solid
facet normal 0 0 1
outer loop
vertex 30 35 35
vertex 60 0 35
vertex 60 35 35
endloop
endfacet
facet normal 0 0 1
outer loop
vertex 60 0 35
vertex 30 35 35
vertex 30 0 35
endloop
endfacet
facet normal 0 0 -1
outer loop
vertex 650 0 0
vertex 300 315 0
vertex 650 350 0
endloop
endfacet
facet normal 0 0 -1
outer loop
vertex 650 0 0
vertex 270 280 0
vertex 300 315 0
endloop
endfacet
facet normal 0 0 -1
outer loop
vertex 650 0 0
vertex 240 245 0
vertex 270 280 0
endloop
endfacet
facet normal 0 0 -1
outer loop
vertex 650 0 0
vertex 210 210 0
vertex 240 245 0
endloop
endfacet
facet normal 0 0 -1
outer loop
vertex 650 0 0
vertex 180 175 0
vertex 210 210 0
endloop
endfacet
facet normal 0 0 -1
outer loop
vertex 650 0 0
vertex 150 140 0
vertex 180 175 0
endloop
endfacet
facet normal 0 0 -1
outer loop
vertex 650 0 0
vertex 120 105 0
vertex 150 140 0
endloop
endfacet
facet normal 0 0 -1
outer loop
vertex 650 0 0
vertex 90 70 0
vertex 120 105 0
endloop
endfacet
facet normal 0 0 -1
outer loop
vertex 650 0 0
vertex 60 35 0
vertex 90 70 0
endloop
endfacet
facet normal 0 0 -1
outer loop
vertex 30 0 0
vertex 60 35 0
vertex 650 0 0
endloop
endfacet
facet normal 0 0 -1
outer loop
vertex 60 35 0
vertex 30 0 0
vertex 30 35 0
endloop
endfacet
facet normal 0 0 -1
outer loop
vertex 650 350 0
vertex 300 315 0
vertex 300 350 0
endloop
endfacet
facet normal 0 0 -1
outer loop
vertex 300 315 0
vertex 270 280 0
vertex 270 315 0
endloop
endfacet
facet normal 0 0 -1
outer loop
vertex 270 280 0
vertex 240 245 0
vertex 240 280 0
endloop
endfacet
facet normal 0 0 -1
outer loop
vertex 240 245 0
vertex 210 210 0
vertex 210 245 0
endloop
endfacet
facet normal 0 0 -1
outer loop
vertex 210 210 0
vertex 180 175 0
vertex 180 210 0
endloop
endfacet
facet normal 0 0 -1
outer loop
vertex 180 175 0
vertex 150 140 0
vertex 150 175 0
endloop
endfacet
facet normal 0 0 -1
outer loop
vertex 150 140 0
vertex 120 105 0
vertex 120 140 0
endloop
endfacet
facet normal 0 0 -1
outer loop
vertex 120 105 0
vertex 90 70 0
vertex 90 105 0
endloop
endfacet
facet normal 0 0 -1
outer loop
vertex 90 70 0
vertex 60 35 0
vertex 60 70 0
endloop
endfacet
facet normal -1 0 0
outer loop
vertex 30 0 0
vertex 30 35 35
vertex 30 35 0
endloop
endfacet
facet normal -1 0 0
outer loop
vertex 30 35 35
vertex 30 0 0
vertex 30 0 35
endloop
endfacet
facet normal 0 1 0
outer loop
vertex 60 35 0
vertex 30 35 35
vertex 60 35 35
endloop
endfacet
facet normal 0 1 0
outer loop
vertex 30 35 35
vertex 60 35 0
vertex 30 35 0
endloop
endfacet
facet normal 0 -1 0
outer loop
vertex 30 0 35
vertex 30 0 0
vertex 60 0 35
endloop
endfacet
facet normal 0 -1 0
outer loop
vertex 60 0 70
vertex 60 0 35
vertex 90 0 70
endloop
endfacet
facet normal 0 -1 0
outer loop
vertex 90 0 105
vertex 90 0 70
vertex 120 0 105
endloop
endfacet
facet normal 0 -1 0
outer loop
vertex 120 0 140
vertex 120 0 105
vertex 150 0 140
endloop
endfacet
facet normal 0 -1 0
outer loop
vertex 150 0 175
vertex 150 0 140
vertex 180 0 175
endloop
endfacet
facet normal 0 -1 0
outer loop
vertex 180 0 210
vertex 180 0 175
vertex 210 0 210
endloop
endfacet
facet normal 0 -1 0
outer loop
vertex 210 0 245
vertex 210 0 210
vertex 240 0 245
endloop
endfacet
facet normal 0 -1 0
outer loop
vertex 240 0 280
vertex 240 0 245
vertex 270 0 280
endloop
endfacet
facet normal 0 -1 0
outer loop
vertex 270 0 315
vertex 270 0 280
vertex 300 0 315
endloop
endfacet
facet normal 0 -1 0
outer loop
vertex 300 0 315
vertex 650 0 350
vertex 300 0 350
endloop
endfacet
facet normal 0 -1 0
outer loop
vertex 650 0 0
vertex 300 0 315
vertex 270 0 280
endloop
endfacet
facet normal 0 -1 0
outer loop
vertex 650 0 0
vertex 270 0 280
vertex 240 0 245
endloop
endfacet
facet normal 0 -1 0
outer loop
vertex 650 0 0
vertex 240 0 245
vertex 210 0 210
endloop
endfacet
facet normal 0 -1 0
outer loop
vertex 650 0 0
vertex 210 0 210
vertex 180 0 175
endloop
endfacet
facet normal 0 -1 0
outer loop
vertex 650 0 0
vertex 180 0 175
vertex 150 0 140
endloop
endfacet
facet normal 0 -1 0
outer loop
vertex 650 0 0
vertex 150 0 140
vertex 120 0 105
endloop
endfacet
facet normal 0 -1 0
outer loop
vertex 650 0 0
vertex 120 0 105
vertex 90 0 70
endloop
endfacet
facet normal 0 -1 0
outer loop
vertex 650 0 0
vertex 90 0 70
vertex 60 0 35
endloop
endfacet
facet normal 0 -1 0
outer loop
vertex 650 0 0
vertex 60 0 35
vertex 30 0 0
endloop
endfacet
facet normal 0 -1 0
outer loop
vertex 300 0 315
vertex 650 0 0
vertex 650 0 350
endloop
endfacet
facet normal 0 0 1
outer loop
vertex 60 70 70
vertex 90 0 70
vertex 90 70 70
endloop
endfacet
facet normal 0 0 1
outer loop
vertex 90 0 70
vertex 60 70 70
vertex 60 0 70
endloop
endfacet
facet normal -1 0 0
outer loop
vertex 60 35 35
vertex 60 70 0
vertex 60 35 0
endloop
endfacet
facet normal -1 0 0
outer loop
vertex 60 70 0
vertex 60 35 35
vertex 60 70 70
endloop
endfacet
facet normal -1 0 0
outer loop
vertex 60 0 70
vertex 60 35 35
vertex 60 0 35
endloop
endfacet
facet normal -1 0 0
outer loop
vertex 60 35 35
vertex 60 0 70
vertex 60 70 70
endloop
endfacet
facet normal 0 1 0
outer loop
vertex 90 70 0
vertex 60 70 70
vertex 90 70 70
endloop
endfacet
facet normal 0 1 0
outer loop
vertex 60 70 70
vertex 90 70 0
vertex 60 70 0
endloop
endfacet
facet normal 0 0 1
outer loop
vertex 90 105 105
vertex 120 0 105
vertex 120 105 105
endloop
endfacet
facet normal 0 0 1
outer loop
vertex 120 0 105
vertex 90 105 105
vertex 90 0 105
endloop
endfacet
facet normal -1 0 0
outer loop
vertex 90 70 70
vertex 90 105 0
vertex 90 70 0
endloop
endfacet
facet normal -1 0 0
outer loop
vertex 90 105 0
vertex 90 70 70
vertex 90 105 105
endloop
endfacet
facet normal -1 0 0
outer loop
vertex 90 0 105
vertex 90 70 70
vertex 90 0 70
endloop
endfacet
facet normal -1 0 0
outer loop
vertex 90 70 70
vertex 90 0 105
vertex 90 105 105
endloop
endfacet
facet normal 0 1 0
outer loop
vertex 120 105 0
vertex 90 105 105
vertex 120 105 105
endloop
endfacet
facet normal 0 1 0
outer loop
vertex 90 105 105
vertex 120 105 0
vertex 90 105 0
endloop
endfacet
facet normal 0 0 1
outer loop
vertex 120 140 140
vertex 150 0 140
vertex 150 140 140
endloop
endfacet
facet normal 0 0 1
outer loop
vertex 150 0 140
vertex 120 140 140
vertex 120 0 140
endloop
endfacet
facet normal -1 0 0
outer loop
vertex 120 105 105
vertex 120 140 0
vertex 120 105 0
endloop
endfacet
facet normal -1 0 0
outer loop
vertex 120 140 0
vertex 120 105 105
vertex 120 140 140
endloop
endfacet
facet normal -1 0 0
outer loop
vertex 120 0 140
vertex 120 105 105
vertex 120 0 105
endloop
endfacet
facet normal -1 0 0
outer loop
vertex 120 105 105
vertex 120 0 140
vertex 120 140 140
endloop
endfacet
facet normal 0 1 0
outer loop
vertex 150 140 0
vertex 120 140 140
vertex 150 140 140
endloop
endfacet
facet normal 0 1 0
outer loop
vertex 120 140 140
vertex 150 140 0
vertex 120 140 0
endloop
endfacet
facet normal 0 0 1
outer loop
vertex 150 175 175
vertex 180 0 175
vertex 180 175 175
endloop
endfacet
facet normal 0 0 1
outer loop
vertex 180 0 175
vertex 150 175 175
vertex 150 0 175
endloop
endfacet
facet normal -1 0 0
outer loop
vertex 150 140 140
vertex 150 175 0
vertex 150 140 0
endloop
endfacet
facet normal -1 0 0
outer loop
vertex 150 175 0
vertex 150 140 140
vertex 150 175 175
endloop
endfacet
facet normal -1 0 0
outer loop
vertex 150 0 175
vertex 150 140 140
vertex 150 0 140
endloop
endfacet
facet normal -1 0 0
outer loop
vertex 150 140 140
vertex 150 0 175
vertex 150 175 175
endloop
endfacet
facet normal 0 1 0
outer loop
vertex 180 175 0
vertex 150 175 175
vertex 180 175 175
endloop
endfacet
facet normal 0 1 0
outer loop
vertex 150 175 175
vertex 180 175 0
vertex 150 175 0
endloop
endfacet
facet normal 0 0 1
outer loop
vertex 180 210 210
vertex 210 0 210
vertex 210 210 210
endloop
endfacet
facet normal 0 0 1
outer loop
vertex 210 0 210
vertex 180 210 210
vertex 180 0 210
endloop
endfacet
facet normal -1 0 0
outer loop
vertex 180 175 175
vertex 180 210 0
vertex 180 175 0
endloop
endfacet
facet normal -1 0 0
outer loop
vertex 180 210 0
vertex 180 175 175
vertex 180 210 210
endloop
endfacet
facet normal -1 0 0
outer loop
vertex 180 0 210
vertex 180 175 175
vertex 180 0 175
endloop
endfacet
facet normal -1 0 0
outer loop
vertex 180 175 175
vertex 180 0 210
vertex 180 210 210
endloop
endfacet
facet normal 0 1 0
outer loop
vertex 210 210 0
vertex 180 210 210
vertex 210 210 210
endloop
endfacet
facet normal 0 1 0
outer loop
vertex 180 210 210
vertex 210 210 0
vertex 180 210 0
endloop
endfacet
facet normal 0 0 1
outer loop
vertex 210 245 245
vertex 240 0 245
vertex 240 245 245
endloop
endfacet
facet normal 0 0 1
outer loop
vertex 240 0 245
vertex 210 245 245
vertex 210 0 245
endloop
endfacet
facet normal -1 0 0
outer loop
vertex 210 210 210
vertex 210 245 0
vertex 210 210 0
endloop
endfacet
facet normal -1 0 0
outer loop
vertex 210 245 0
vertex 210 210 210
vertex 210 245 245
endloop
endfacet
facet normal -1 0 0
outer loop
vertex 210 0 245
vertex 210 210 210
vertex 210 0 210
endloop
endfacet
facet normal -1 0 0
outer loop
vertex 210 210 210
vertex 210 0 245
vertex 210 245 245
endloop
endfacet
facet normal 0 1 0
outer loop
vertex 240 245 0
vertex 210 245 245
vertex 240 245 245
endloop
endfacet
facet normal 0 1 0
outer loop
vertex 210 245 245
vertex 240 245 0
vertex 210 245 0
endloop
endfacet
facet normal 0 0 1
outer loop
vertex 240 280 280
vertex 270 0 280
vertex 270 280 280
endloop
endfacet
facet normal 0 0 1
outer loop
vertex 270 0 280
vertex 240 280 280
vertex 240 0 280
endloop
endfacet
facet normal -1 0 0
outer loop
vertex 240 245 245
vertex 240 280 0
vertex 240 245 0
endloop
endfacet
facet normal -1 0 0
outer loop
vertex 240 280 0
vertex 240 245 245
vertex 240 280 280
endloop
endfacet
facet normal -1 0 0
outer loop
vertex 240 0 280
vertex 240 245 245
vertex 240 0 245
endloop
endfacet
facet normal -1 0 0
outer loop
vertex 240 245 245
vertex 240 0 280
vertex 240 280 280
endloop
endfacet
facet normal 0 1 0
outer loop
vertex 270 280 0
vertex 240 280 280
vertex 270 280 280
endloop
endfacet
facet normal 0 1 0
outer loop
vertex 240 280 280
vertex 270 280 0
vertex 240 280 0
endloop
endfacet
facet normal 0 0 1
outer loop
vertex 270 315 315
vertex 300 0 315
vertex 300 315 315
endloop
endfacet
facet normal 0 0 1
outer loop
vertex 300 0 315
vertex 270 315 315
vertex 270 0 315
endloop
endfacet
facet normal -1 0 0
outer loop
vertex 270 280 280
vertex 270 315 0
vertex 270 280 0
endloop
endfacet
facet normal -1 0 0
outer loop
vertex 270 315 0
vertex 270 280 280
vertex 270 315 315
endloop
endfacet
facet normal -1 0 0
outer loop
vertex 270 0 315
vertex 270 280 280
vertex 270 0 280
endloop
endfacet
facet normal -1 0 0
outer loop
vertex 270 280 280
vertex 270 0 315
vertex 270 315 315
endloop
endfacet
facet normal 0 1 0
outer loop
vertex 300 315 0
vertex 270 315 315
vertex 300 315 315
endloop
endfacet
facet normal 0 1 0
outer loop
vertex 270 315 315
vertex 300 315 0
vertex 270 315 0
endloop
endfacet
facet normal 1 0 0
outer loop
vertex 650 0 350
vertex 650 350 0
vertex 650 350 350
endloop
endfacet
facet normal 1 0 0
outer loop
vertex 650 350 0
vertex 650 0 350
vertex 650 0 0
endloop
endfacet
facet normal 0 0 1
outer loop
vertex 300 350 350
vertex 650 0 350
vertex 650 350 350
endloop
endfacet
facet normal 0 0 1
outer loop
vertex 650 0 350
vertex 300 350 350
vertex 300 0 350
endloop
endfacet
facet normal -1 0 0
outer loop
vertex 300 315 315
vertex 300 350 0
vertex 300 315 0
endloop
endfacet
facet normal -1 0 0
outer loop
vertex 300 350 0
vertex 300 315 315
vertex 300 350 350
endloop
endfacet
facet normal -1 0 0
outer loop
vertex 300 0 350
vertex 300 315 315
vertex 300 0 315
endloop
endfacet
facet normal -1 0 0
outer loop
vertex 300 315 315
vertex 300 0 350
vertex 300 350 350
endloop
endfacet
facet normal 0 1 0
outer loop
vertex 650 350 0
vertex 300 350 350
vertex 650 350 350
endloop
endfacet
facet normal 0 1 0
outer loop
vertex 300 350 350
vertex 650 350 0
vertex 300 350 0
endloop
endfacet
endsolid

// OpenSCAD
union() { 
    translate([30, 0, 0]) { 
        cube([35, 35, 35]);
    }
    translate([60, 0, 0]) { 
        cube([70, 70, 70]);
    }
    translate([90, 0, 0]) { 
        cube([105, 105, 105]);
    }
    translate([120, 0, 0]) { 
        cube([140, 140, 140]);
    }
    translate([150, 0, 0]) { 
        cube([175, 175, 175]);
    }
    translate([180, 0, 0]) { 
        cube([210, 210, 210]);
    }
    translate([210, 0, 0]) { 
        cube([245, 245, 245]);
    }
    translate([240, 0, 0]) { 
        cube([280, 280, 280]);
    }
    translate([270, 0, 0]) { 
        cube([315, 315, 315]);
    }
    translate([300, 0, 0]) { 
        cube([350, 350, 350]);
    }
}
